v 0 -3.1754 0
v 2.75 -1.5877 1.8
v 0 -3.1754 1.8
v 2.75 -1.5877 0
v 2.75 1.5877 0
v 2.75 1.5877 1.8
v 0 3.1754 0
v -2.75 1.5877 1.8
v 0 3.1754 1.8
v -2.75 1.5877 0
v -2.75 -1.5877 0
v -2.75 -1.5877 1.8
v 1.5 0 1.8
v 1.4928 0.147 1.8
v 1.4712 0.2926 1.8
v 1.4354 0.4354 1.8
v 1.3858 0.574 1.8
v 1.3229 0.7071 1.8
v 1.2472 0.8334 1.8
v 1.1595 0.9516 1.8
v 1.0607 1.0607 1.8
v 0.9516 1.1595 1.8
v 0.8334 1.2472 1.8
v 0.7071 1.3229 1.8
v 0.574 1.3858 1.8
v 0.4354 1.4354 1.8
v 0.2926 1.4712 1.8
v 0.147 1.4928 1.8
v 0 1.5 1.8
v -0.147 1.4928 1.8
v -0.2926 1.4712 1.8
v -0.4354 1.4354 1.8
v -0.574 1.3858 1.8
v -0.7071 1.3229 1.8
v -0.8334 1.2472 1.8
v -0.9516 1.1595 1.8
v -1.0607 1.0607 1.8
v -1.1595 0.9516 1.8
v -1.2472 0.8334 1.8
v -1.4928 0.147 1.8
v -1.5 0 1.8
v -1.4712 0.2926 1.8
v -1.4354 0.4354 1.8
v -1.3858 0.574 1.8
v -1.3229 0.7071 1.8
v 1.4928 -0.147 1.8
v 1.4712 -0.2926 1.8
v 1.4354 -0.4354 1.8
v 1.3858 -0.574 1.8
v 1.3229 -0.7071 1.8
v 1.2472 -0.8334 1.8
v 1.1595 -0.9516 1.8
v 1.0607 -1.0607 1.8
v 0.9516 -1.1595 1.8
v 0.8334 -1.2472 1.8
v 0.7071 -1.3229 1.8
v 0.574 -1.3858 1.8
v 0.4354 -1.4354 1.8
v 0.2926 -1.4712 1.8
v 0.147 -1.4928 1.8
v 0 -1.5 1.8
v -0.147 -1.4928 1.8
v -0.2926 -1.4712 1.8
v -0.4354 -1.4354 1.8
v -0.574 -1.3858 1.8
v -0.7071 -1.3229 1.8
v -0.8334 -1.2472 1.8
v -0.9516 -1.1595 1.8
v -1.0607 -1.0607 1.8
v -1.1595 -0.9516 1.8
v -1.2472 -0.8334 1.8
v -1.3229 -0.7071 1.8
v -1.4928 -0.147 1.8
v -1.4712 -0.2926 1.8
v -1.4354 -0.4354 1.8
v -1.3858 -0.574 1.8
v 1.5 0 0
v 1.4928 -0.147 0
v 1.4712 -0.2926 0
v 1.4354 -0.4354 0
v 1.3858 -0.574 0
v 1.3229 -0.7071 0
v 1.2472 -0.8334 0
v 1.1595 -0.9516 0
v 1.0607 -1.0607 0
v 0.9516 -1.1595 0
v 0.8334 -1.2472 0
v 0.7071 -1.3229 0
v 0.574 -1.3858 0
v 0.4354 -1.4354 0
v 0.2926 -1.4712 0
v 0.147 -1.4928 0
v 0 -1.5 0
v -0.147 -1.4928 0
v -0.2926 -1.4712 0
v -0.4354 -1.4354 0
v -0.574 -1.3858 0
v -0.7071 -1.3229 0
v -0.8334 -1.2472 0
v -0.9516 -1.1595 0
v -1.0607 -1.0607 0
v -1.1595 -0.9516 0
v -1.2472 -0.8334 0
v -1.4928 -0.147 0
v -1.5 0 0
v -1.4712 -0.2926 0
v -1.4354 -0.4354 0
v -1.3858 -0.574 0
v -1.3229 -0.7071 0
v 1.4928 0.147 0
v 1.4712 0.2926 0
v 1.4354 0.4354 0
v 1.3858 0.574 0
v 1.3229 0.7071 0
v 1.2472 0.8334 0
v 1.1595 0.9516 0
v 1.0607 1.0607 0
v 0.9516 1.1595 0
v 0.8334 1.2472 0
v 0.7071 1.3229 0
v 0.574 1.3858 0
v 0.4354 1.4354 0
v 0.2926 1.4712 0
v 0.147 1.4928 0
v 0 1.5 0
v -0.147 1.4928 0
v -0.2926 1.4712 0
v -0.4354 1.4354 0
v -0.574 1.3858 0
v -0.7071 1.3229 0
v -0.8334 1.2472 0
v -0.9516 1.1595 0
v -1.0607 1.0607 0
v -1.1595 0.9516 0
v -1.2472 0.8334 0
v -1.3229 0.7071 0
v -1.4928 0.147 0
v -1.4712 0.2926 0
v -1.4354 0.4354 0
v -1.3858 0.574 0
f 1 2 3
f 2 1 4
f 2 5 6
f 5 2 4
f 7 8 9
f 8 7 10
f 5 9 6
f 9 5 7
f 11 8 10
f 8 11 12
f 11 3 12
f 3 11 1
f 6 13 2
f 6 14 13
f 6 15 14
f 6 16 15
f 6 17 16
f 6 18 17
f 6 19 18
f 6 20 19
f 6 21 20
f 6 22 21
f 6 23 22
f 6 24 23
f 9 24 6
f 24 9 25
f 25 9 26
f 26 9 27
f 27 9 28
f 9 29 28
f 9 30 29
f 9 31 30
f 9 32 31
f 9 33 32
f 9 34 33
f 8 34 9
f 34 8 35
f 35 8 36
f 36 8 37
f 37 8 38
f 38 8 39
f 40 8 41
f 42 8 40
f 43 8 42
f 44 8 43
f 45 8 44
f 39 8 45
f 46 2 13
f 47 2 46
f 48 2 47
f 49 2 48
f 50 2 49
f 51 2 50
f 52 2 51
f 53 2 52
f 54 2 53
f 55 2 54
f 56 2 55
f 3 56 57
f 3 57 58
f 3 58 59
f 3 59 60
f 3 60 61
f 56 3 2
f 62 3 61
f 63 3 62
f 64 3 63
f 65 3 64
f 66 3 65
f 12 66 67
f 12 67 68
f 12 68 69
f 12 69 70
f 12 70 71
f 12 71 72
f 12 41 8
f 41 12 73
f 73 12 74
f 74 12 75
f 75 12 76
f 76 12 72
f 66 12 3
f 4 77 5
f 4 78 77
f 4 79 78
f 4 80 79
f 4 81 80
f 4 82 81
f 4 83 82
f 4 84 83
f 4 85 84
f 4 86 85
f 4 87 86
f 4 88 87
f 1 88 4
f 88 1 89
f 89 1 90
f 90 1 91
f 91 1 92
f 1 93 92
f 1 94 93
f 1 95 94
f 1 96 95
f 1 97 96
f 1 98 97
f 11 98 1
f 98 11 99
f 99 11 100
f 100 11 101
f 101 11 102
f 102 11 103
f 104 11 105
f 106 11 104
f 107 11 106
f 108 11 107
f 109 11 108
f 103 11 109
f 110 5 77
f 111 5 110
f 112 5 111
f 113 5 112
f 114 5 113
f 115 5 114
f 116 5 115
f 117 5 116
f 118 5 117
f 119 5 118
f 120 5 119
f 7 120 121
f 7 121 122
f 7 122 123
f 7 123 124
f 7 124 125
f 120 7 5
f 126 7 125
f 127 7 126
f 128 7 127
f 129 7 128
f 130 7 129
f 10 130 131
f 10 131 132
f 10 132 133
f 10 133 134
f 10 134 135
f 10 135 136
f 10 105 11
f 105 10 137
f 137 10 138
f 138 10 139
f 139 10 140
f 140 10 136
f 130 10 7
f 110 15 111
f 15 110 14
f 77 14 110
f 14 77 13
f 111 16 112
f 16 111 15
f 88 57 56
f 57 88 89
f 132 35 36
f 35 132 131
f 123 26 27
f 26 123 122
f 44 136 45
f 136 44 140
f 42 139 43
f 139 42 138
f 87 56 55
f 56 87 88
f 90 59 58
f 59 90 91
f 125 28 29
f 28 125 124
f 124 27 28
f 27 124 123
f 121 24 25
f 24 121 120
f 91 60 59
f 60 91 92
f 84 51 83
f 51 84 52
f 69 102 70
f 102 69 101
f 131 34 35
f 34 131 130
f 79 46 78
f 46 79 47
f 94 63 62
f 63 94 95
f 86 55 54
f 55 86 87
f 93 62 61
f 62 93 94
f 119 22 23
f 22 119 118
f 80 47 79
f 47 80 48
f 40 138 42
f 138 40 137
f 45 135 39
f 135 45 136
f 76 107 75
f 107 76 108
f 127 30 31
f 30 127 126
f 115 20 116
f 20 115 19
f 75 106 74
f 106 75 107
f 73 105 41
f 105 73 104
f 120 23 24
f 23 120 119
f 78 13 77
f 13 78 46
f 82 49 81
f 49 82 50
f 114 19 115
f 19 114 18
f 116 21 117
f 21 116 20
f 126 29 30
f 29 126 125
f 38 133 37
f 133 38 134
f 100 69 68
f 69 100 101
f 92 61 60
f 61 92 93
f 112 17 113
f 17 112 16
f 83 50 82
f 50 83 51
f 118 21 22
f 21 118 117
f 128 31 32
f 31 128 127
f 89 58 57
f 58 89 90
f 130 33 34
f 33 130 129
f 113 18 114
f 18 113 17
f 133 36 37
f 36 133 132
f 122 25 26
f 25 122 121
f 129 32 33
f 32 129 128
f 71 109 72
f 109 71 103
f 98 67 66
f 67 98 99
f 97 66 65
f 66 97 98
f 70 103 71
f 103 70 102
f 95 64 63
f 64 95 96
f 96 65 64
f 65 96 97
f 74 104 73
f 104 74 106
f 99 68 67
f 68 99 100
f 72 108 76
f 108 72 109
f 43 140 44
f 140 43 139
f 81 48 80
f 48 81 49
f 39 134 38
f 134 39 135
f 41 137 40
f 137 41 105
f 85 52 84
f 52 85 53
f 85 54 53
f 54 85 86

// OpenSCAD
module hex_nut() {
    difference() {
        // Create hexagonal prism
        scale([1, 1, 1.8/2])  // Scale to thickness
        rotate([0, 0, 30])  // Align flat sides horizontally
        cylinder(r=5.5/sqrt(3), h=2, $fn=6);  // Hexagon with 5.5mm across flats

        // Subtract cylindrical hole
        translate([0, 0, -1])
        cylinder(r=3.0/2, h=4, $fn=64);  // 3.0mm diameter hole
    }
}

hex_nut();
